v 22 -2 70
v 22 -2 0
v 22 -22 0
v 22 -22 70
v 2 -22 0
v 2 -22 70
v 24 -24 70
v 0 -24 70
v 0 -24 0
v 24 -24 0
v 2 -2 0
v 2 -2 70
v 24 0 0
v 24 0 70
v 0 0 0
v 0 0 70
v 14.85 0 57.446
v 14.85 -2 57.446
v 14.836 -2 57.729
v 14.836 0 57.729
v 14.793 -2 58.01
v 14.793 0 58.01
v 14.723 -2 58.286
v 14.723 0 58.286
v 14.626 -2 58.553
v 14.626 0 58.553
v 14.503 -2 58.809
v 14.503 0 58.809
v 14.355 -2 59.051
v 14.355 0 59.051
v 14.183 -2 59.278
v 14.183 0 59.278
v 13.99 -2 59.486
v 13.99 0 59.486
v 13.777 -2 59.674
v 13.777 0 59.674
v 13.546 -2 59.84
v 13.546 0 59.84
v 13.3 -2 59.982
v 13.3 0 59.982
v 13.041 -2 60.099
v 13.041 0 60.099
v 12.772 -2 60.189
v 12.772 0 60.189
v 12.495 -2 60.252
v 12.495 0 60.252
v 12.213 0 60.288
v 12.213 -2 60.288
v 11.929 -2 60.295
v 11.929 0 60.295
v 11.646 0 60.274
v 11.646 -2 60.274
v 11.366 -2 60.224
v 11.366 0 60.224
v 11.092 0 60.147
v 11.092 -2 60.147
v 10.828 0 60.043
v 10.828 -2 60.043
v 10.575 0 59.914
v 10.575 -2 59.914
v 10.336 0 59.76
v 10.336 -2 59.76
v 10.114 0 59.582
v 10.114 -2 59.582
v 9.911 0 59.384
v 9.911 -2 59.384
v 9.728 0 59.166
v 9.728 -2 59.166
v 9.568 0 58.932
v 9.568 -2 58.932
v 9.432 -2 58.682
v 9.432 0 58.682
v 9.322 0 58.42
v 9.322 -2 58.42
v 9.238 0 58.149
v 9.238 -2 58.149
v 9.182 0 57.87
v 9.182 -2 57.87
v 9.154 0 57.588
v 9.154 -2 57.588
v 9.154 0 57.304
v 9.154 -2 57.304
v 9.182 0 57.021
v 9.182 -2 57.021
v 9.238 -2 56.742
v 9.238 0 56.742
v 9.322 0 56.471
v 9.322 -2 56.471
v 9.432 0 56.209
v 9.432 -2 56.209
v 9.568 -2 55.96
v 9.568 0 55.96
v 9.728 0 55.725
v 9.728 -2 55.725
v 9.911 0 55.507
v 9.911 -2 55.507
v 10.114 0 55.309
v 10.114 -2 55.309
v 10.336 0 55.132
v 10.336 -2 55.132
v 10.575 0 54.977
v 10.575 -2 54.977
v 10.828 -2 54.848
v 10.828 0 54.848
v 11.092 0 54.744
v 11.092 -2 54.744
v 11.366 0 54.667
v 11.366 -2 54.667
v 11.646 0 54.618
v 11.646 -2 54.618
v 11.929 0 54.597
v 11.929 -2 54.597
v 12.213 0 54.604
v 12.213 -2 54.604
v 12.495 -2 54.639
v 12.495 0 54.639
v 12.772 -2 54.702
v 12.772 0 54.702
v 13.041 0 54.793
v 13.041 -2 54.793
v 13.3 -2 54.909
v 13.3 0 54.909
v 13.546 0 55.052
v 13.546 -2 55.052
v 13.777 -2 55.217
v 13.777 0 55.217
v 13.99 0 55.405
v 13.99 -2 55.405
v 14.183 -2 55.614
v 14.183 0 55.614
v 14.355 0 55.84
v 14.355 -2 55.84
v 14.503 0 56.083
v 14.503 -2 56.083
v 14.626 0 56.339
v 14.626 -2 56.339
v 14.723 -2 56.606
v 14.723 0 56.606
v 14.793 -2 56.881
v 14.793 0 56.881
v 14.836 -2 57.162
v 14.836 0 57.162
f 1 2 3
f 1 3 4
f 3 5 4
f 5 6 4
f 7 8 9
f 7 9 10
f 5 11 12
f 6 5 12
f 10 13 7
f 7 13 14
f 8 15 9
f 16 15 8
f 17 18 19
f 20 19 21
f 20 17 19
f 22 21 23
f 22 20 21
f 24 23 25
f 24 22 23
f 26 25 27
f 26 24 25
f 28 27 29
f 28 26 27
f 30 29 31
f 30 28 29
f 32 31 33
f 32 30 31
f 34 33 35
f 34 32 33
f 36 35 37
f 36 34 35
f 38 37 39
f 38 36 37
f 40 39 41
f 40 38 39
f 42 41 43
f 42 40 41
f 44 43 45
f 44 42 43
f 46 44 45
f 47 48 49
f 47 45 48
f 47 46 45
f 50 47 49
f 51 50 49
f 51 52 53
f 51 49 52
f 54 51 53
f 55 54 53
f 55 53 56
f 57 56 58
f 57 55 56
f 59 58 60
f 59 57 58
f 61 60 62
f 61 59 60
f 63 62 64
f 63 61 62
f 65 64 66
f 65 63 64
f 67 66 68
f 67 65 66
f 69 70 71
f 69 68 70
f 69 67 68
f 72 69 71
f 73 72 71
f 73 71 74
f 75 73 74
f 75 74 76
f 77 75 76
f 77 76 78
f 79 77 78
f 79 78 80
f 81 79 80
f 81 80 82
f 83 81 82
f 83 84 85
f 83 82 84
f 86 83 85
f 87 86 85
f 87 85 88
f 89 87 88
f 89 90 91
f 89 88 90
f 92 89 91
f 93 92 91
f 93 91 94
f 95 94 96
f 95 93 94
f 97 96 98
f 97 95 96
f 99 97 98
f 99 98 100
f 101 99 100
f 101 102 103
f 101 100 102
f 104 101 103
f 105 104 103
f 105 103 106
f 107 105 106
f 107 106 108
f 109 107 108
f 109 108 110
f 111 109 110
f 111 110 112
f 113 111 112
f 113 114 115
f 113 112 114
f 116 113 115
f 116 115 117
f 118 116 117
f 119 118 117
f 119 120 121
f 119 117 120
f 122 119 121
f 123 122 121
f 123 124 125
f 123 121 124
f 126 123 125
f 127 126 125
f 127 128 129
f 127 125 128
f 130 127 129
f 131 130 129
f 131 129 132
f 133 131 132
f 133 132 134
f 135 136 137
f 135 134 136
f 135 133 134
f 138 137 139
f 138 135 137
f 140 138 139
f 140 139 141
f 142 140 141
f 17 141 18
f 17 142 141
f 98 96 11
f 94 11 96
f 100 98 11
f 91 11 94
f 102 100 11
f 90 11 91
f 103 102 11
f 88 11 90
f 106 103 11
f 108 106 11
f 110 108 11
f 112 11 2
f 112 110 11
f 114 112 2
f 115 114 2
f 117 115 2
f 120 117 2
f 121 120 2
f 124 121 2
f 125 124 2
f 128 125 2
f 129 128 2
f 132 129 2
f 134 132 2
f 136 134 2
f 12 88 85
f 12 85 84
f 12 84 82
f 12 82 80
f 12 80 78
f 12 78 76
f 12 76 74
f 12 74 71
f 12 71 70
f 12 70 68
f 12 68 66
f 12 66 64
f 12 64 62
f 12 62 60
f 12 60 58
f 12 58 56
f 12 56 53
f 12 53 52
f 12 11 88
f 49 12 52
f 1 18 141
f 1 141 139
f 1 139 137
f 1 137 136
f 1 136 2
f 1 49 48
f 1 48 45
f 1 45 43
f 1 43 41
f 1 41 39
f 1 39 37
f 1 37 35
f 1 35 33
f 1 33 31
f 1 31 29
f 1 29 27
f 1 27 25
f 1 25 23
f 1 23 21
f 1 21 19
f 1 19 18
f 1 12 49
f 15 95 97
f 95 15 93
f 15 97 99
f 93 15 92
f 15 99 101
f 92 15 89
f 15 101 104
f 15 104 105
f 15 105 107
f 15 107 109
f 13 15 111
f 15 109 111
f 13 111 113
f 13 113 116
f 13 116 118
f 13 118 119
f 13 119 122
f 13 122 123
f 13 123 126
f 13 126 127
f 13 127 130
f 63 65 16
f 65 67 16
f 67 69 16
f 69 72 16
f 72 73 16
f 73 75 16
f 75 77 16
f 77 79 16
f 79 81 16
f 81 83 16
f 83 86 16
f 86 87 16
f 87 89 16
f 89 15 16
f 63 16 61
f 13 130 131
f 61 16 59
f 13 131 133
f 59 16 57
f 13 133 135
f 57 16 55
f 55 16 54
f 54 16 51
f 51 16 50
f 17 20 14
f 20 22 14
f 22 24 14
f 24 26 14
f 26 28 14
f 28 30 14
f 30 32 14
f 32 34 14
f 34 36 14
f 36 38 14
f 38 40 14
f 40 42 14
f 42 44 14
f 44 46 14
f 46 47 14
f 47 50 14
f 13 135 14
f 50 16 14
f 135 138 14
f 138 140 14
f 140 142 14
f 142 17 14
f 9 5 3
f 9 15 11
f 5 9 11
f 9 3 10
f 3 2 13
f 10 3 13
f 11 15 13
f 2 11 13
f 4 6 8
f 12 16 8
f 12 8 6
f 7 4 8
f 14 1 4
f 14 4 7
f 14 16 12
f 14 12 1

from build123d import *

# Parameters (mm, degrees)
F0_W     = 24
F0_H     = 70
F1_DEPTH = 24
F2_T     = -2
F3_R     = 2.85
F4_DEPTH = 3


with BuildPart() as f1:
    # F0 (on Front) → F1 (new body)
    with BuildSketch(Plane.XZ):
        with Locations((12, 35)):
            Rectangle(F0_W, F0_H)
    extrude(amount=F1_DEPTH)

    # F2
    f2_openings = [f1.faces().sort_by_distance(p)[0] for p in [
        (12, -12, 70),
        (12, -12, 0),
    ]]
    offset(amount=F2_T, openings=f2_openings)

    # F3 (on Front) → F4 (cut)
    with BuildSketch(Plane.XZ):
        with Locations((12, 57.445619)):
            Circle(F3_R)
    extrude(amount=F4_DEPTH, mode=Mode.SUBTRACT)


solid = f1.part
